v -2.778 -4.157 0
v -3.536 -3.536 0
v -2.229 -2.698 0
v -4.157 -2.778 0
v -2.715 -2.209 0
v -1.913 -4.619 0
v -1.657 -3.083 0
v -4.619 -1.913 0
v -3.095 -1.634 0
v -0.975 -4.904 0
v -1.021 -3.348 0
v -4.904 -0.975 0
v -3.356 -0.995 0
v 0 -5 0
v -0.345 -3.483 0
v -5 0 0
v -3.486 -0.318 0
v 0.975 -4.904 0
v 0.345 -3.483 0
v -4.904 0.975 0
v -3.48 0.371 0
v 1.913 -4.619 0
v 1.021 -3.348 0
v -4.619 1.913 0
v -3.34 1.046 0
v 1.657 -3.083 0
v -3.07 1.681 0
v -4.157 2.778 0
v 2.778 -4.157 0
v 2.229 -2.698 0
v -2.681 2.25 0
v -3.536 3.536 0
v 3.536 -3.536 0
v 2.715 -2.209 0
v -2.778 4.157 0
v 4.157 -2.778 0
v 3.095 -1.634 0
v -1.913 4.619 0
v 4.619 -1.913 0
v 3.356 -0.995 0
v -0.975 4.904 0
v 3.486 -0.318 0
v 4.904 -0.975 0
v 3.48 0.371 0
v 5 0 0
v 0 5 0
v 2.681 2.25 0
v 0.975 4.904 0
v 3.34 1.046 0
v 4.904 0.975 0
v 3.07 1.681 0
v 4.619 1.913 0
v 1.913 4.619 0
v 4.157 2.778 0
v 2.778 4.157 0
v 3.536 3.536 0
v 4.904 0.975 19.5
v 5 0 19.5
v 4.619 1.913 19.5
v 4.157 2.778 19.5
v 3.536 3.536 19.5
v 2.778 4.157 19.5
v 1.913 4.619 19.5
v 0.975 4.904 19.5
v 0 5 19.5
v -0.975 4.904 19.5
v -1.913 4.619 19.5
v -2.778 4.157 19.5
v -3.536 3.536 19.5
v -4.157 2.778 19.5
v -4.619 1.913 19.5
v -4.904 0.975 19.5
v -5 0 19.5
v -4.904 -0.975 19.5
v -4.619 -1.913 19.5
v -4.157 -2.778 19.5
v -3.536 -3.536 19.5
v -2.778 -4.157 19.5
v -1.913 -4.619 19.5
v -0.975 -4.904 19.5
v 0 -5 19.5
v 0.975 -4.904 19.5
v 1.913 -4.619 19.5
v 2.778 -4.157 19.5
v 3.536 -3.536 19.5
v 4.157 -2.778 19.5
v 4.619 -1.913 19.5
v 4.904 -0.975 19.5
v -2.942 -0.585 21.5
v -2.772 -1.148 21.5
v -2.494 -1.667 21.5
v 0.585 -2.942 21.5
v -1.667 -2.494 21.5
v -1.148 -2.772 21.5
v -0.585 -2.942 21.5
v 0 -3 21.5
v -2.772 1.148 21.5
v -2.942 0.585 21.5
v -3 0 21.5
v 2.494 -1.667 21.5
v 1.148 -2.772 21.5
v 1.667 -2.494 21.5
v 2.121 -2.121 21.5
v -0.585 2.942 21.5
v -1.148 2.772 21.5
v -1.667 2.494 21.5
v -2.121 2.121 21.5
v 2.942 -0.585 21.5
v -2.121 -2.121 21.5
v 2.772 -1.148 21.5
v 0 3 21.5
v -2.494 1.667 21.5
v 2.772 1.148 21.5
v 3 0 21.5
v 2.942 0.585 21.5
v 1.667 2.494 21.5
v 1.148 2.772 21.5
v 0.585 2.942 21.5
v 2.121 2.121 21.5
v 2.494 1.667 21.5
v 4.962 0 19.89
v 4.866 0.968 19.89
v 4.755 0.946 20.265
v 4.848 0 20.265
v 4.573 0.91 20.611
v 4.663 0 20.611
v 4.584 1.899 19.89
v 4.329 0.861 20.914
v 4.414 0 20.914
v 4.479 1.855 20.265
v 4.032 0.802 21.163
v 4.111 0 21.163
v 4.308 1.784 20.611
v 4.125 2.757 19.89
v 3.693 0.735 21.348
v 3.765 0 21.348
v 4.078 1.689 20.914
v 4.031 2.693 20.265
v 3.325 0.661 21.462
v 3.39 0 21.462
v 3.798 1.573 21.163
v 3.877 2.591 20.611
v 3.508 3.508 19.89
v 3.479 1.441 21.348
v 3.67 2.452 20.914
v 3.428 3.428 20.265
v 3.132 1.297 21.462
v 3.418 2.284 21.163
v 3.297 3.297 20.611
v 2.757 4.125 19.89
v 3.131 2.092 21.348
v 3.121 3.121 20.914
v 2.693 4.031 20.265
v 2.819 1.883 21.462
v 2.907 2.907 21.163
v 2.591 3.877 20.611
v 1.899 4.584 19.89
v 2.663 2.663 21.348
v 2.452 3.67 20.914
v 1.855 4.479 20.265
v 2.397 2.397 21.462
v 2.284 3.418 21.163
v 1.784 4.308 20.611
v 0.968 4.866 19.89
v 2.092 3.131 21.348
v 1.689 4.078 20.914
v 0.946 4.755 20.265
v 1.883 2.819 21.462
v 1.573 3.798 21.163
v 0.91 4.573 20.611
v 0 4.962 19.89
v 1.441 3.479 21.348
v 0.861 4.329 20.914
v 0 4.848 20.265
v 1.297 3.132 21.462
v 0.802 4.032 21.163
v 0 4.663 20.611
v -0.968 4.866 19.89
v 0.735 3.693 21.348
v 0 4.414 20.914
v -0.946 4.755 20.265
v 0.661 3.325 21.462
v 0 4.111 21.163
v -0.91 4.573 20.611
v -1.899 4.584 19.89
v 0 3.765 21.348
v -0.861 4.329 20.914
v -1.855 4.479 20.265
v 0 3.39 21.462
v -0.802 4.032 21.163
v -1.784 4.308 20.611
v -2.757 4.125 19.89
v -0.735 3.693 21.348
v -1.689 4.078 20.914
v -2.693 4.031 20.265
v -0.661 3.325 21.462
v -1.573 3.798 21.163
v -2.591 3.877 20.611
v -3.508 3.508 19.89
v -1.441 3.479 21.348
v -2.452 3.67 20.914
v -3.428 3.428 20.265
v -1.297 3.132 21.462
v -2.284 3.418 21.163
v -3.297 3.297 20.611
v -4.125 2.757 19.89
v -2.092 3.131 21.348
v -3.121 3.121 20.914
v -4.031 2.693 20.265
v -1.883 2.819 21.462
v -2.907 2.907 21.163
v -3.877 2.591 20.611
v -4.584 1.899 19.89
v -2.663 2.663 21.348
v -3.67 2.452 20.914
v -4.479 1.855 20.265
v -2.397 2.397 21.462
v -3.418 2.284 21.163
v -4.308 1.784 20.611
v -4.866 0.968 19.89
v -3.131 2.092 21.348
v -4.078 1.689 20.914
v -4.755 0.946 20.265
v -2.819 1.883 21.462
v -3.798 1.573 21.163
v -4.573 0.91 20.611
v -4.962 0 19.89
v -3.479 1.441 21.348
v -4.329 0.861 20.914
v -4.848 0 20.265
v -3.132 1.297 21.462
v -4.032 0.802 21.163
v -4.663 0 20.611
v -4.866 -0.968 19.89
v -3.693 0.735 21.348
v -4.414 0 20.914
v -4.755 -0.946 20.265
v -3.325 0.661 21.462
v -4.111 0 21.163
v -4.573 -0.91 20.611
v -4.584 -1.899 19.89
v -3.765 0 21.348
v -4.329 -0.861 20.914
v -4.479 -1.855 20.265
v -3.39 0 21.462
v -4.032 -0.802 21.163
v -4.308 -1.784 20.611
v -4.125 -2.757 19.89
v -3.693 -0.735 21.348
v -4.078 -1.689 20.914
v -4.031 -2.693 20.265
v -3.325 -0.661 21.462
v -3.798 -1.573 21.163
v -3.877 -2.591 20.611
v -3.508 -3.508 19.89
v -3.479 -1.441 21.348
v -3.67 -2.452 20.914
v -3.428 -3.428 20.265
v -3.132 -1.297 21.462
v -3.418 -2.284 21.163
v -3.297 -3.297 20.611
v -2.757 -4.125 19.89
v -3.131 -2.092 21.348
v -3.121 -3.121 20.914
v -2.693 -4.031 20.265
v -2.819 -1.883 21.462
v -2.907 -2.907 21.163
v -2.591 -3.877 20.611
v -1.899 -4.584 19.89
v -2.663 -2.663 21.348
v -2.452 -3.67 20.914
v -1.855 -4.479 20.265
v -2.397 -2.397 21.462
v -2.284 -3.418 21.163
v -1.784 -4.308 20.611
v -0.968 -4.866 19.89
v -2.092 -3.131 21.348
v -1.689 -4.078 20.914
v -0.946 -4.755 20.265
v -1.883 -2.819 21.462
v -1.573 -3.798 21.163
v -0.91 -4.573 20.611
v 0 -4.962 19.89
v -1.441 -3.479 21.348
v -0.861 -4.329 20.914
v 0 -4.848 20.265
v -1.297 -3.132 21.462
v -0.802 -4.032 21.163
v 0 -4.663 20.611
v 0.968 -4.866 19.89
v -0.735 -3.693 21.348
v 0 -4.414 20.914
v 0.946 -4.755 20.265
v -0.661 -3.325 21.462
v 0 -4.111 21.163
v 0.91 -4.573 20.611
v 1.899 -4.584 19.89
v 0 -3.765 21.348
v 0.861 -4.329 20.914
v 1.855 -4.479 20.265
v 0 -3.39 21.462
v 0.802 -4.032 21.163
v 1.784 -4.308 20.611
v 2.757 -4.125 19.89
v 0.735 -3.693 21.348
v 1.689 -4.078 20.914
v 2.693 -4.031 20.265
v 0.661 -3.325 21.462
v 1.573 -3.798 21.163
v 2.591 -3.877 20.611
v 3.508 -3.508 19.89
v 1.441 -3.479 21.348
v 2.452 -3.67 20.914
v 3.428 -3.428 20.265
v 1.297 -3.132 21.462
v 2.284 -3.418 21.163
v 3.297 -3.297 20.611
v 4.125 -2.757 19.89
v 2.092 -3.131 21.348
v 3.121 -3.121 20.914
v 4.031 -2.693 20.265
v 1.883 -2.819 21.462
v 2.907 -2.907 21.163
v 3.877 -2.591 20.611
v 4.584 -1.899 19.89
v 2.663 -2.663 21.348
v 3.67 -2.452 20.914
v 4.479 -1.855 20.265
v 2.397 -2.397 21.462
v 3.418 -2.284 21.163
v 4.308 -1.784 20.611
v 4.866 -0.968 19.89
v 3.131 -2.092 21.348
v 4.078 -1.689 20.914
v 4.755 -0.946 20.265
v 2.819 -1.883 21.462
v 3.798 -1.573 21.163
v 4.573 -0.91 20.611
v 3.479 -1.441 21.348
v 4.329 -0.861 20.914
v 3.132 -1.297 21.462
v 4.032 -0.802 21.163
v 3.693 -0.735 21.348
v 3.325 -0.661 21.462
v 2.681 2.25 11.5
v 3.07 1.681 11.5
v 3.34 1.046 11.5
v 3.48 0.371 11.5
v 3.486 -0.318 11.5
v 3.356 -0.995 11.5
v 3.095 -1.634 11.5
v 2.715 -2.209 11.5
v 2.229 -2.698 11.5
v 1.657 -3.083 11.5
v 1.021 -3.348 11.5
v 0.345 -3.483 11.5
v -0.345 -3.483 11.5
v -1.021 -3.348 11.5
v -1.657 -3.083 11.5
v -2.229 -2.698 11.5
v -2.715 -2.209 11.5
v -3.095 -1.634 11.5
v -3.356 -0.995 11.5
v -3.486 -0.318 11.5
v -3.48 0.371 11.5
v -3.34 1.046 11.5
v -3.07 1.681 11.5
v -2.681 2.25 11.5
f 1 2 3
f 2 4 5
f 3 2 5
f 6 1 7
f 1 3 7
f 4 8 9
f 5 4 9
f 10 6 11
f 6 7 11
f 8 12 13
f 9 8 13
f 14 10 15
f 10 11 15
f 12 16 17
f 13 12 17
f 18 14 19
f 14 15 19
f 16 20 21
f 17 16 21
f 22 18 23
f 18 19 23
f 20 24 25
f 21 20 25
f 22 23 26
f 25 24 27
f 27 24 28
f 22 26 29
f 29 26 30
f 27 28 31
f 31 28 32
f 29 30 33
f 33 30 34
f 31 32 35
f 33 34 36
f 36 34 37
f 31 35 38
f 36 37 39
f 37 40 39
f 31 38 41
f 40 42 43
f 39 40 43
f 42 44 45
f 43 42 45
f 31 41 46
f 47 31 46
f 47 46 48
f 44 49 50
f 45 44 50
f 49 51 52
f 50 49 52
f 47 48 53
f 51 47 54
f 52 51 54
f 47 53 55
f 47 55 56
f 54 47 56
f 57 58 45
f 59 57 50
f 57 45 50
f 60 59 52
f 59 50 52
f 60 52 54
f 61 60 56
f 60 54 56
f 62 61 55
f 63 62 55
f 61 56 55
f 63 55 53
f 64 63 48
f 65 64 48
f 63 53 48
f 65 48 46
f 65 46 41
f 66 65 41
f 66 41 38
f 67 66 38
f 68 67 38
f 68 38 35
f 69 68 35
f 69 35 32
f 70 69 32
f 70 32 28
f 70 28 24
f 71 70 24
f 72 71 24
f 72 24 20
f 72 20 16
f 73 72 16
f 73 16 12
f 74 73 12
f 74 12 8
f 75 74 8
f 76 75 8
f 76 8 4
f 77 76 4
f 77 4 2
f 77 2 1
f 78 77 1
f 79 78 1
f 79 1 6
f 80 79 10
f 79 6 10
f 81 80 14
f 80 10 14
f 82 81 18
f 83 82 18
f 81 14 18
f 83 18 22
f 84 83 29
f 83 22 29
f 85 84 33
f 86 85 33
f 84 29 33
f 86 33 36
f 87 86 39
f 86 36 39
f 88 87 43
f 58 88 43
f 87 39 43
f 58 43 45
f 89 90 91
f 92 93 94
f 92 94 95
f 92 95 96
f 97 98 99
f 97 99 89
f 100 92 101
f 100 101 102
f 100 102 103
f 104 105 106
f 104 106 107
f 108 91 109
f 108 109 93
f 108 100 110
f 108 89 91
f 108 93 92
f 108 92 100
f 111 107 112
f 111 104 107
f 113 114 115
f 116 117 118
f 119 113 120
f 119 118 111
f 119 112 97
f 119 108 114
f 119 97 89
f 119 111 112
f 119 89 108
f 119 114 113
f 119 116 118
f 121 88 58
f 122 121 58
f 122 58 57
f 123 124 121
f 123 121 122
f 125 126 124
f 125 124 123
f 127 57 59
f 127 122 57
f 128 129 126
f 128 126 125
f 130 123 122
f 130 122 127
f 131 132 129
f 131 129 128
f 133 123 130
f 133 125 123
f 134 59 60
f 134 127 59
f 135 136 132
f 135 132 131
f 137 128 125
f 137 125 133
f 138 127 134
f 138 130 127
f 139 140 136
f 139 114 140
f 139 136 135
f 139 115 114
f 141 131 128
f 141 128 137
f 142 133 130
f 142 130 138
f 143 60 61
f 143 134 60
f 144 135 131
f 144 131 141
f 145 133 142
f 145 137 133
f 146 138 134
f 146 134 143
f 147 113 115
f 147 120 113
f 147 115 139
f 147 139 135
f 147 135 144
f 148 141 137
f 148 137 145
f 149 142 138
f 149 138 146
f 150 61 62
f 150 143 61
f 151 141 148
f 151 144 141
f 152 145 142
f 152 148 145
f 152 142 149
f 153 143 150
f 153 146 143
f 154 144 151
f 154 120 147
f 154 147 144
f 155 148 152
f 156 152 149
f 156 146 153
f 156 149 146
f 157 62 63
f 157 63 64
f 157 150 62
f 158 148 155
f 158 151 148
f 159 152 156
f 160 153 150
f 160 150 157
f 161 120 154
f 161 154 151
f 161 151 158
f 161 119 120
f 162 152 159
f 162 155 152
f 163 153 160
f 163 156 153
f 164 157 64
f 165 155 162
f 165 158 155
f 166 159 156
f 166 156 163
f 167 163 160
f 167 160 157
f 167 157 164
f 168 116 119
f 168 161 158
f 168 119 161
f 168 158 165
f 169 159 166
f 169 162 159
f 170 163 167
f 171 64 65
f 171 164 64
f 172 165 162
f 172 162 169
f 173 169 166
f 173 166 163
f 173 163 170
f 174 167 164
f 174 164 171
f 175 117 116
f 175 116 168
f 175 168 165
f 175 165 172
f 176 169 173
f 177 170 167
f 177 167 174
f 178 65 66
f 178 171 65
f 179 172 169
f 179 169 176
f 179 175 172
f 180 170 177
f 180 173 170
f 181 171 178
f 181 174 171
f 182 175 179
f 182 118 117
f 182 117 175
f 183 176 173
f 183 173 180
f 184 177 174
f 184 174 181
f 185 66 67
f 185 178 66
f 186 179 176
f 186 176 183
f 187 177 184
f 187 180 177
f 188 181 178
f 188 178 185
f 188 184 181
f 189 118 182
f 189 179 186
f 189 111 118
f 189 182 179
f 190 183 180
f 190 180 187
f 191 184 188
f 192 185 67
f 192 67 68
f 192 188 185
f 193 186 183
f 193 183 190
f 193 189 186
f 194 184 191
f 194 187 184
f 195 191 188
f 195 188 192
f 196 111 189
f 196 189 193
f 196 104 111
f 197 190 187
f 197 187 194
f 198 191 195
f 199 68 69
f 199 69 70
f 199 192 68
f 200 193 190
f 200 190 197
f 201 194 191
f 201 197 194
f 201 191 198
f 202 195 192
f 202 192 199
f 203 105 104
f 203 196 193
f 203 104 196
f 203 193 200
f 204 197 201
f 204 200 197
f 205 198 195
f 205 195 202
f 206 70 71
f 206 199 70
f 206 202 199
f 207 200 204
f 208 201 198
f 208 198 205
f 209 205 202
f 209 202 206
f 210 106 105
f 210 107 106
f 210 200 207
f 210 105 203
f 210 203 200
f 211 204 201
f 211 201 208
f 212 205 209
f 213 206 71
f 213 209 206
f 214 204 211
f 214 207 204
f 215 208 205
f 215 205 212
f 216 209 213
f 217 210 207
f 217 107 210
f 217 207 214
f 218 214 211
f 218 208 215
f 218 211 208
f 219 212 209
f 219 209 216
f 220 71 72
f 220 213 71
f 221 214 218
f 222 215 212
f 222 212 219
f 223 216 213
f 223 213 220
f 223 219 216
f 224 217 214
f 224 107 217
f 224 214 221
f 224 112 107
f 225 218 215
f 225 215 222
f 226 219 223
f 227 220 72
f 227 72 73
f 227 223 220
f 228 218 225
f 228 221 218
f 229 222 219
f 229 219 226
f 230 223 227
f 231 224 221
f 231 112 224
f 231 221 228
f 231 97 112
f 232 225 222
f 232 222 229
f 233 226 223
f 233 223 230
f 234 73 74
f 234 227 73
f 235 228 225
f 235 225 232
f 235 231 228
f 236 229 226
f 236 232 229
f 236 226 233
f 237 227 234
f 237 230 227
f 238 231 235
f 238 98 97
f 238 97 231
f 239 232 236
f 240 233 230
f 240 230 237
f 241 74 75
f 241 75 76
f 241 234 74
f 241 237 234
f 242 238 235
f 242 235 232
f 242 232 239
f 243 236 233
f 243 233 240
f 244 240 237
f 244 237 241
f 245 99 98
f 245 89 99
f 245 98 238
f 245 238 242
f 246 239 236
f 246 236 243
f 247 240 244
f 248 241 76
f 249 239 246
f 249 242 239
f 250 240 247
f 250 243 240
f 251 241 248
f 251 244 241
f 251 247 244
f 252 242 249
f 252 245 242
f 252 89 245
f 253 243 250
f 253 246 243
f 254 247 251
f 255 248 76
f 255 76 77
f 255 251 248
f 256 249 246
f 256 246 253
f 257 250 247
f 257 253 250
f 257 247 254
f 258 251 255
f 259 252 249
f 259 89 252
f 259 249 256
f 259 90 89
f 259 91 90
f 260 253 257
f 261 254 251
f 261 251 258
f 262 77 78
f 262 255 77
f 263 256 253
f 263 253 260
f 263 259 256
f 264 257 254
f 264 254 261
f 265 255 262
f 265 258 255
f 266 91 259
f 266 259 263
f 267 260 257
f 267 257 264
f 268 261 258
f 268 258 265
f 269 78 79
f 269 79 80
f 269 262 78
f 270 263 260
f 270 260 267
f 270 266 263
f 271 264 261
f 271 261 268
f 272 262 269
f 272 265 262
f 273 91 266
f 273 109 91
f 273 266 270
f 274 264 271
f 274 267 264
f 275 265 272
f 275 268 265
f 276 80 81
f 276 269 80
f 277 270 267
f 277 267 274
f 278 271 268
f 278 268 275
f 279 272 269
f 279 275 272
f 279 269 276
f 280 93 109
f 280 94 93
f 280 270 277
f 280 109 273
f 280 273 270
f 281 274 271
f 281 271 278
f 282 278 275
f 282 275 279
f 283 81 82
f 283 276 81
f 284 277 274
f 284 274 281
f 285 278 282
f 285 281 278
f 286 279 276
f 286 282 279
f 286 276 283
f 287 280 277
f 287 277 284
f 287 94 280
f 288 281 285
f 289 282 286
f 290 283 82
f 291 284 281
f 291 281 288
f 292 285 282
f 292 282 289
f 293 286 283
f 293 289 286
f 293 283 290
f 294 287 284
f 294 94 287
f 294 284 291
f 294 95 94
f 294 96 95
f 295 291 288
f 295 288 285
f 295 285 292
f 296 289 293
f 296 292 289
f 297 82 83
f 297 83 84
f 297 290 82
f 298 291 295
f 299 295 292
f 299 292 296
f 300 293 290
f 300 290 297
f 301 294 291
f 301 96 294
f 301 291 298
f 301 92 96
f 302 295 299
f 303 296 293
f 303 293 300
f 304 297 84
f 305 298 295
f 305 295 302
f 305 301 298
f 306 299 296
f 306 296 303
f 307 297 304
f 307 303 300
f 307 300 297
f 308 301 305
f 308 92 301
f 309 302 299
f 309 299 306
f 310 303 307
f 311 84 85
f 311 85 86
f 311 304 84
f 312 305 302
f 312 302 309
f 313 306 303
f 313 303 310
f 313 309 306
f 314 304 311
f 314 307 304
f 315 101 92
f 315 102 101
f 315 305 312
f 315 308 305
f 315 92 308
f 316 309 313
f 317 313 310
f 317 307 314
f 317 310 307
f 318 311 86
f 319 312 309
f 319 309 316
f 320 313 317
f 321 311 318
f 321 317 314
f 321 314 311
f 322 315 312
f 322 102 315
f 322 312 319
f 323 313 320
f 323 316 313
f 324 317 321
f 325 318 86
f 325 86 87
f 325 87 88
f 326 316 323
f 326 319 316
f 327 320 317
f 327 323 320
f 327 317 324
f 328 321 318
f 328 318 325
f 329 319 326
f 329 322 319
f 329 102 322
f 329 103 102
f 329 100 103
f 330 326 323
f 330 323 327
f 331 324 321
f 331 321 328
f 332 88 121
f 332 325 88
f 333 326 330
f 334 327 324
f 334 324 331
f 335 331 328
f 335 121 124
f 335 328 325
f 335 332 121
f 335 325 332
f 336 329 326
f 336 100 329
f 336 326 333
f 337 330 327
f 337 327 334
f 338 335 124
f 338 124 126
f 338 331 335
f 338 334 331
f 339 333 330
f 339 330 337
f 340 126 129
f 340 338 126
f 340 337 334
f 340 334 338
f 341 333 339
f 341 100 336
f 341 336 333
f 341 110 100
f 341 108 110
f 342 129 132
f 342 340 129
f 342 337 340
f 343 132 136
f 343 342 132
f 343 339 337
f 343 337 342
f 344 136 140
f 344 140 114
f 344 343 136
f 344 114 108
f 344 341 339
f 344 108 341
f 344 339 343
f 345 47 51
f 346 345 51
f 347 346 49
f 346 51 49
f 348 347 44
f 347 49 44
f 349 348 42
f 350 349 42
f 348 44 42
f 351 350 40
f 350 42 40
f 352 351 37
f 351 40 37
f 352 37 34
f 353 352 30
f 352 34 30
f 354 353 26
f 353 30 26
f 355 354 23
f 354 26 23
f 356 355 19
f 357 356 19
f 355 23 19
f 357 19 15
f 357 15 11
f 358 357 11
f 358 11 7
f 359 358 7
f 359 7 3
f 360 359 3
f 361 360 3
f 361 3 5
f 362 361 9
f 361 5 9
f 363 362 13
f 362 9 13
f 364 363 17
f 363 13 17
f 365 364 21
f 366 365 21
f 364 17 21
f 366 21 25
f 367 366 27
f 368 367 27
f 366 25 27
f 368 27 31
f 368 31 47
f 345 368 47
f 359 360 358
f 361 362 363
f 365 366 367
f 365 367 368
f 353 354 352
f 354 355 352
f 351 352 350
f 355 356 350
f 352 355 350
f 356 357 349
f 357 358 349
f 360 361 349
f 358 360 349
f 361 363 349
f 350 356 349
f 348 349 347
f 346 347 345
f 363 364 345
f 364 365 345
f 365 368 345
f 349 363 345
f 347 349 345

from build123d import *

# Parameters (mm, degrees)
SKETCH1_R           = 5
BOSS_EXTRUDE1_DEPTH = 11.5
SKETCH2_R           = 5
BOSS_EXTRUDE2_DEPTH = 10
FILLET2_R           = 2


with BuildPart() as part:
    # Sketch1 → Boss-Extrude1 (new body)
    with BuildSketch(Plane.XY):
        Circle(SKETCH1_R)
        with BuildLine():
            Line((-2.680951324, 2.25), (0, 2.25))
            Line((0, 2.25), (2.680951324, 2.25))
            ThreePointArc((2.680951324, 2.25), (0, -3.5), (-2.680951324, 2.25))
        make_face(mode=Mode.SUBTRACT)
    extrude(amount=BOSS_EXTRUDE1_DEPTH)

    # Sketch2 → Boss-Extrude2 (add)
    with BuildSketch(Plane.XY.offset(11.5)):
        Circle(SKETCH2_R)
    extrude(amount=BOSS_EXTRUDE2_DEPTH)

    # Fillet2
    fillet2_edges = [part.edges().sort_by_distance(p)[0] for p in [
        (-5, 0, 21.5),
    ]]
    fillet(fillet2_edges, radius=FILLET2_R)


solid = part.part
